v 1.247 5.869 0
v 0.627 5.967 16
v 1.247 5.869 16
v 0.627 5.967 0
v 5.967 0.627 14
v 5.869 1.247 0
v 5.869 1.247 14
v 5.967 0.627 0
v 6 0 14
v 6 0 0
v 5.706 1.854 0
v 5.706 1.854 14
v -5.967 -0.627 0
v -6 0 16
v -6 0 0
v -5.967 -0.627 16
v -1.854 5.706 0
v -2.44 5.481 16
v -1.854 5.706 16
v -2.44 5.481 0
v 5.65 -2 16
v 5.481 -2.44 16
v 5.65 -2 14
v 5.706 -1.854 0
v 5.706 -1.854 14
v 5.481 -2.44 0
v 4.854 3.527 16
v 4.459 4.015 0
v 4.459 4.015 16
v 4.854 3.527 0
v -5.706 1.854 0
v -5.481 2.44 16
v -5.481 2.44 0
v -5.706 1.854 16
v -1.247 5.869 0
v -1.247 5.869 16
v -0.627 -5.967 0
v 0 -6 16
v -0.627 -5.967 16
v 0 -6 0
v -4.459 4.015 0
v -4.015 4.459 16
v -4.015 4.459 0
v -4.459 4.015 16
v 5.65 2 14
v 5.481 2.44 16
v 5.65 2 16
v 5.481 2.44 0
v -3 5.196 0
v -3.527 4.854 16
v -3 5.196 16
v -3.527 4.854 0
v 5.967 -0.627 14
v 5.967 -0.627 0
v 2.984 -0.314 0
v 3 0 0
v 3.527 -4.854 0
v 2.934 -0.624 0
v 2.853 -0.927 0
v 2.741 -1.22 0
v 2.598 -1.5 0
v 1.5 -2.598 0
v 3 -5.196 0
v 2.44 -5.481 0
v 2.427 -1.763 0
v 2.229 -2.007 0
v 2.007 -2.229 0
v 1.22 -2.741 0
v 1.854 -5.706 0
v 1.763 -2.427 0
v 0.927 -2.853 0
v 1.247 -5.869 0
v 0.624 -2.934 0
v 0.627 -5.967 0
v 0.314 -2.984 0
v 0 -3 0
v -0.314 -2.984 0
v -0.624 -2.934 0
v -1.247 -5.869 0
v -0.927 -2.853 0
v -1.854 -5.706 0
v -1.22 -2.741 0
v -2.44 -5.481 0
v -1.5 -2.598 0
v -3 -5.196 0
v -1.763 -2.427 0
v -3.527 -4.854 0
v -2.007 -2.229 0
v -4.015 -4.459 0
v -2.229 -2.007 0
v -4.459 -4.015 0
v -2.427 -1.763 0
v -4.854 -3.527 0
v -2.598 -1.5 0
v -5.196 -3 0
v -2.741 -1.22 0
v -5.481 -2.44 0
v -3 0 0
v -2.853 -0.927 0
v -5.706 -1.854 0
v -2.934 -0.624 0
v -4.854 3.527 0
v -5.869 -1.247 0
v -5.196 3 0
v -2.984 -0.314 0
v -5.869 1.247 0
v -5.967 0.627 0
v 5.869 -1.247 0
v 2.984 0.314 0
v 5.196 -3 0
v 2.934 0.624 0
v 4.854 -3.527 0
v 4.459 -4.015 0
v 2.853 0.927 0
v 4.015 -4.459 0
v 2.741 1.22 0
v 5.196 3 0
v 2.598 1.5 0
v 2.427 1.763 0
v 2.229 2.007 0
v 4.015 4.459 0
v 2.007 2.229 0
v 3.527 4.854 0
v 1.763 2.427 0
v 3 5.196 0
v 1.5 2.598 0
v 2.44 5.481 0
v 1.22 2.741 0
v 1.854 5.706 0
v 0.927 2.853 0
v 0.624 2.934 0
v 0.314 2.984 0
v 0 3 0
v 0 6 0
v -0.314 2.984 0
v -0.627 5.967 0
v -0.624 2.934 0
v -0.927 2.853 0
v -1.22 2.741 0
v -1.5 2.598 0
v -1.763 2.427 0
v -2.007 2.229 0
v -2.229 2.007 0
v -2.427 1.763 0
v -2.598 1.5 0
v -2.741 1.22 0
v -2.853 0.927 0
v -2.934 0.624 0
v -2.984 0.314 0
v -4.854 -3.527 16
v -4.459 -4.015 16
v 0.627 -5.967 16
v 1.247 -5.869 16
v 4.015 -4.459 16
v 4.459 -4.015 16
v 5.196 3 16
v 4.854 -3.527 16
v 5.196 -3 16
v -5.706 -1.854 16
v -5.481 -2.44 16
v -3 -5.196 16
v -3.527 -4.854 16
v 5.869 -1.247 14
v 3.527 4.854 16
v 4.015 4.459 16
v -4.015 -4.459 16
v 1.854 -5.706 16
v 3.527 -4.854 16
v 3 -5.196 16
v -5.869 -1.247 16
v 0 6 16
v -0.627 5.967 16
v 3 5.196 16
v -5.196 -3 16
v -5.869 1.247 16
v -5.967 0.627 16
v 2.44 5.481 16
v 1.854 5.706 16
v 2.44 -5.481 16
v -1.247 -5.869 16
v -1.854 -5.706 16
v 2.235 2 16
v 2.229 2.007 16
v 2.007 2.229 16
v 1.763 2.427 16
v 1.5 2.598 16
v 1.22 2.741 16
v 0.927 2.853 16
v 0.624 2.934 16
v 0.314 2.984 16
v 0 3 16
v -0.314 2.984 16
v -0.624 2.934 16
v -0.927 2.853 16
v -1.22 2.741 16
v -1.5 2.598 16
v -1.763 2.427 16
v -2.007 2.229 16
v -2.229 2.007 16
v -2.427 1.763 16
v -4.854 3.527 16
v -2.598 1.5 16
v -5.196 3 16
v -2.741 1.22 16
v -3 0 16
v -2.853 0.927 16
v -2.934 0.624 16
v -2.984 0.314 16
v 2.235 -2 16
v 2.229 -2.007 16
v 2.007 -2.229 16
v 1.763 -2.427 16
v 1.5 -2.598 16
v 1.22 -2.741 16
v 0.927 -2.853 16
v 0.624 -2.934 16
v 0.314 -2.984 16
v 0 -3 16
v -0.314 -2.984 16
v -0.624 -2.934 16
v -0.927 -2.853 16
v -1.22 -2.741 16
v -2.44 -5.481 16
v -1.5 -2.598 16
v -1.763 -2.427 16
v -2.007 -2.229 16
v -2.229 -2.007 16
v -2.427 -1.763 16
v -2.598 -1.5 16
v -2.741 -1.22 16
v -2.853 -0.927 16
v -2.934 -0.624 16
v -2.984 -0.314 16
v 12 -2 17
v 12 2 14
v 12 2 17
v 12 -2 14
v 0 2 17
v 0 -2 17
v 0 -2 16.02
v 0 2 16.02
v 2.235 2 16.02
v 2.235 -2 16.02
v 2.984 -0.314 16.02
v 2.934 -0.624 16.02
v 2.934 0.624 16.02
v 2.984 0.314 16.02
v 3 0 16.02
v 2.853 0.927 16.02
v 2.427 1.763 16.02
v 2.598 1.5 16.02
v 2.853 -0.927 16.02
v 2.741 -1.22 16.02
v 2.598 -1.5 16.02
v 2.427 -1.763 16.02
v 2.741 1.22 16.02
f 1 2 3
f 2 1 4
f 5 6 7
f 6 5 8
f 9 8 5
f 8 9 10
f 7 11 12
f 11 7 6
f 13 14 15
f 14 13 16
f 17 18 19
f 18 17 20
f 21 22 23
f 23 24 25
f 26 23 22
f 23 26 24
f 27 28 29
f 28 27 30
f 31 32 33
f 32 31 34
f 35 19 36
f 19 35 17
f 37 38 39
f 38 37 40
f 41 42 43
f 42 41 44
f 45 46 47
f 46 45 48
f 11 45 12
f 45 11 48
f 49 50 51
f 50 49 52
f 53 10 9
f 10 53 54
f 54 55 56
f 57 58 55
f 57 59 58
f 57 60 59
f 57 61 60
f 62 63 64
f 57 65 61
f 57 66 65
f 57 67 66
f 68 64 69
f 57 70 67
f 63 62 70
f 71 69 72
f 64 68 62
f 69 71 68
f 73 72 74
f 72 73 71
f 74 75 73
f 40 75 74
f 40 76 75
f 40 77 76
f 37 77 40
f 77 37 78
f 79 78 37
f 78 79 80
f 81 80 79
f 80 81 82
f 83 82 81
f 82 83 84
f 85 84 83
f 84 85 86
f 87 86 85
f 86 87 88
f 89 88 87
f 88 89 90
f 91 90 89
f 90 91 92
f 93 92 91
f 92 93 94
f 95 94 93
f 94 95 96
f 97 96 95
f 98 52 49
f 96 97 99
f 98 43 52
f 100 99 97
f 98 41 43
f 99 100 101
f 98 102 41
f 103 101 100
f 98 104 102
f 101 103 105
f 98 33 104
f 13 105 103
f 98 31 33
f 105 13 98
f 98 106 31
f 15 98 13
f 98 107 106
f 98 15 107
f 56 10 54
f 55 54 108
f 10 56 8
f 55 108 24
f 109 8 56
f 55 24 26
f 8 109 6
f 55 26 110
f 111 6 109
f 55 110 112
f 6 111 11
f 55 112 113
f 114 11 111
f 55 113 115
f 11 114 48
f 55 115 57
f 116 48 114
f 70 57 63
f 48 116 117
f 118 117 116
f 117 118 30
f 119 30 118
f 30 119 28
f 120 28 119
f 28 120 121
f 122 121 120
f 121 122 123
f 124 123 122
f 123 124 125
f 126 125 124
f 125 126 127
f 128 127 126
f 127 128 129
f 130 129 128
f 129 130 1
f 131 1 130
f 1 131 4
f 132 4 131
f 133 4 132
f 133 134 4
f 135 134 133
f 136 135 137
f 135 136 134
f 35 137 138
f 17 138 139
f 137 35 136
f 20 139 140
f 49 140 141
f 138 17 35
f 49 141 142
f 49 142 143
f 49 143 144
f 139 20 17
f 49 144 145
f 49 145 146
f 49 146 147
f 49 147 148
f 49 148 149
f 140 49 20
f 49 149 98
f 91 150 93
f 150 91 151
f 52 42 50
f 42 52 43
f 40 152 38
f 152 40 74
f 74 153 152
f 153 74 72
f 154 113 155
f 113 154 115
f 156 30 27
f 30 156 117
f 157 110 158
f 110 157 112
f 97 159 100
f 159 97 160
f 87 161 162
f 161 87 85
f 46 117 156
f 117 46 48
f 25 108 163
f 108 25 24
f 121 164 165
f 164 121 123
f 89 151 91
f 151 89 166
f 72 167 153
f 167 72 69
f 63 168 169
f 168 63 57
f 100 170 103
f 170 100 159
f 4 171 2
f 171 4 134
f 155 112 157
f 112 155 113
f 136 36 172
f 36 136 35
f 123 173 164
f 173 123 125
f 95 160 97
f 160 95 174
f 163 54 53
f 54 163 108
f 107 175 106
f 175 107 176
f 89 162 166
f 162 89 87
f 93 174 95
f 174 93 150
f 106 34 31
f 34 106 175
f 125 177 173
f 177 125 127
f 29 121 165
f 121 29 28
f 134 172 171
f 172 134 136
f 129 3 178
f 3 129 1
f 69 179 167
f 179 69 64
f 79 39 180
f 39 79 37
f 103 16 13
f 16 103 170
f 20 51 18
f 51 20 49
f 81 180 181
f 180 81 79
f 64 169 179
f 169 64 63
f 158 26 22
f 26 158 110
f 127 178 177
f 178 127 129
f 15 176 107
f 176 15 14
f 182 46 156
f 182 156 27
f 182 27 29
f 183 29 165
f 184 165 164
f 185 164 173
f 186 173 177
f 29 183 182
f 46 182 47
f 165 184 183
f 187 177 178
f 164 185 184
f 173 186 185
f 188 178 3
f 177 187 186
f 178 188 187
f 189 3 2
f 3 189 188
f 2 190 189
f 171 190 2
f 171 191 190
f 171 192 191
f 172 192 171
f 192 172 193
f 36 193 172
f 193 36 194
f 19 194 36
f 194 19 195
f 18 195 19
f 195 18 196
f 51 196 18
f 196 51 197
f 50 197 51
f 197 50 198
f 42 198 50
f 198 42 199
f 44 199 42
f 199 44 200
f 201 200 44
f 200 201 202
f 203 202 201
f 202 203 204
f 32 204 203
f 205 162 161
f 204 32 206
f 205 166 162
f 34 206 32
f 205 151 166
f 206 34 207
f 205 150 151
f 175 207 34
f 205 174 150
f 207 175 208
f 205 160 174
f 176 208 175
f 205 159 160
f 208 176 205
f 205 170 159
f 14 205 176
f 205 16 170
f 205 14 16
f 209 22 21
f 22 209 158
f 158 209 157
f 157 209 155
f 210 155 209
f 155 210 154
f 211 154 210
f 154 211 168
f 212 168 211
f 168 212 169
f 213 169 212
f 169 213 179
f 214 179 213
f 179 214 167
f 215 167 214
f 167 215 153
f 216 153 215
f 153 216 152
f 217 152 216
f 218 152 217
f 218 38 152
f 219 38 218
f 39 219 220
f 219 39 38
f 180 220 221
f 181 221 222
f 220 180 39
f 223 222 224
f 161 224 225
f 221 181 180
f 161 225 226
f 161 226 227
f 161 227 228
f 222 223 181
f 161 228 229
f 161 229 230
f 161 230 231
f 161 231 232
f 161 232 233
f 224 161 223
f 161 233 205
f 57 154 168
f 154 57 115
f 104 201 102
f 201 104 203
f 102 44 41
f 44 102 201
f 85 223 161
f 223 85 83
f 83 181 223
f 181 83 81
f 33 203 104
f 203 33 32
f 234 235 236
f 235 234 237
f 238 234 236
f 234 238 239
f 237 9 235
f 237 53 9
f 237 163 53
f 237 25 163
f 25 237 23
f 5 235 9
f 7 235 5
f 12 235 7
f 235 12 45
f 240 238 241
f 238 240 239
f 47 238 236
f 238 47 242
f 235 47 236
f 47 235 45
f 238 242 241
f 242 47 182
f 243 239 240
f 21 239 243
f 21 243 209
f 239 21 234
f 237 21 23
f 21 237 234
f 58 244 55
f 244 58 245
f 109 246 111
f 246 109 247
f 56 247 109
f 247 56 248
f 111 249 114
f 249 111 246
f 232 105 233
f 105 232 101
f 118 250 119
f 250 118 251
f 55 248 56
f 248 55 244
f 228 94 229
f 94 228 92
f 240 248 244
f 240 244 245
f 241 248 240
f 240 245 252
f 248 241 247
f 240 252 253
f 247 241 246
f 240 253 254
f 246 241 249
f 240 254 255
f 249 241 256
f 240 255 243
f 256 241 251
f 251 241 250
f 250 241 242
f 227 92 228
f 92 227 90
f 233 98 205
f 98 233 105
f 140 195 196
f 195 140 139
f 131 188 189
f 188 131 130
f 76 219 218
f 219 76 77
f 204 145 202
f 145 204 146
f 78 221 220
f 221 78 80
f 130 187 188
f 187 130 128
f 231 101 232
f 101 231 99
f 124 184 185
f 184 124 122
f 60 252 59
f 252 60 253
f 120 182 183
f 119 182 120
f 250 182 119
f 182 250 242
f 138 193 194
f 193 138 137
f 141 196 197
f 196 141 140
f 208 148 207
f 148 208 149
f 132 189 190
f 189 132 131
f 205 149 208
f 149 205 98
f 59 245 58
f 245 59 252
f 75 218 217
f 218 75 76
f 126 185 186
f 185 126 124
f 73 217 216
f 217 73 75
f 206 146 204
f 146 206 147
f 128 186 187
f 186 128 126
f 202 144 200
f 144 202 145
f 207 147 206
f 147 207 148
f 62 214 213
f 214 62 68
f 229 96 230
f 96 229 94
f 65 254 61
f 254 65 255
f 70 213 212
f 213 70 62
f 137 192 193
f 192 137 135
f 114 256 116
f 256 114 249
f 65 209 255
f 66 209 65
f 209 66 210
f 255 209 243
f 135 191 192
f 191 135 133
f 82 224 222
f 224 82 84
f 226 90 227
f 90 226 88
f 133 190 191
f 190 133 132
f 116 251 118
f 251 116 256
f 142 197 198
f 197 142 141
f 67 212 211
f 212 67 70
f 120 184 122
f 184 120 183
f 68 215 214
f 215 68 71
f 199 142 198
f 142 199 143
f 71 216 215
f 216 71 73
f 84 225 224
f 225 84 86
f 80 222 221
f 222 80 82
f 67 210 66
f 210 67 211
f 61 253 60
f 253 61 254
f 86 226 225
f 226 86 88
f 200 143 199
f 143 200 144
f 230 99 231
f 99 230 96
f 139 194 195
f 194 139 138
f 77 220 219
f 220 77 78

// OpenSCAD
// Quarter-turn cam lock.
$fn = 60;
eps = 0.02;
body_d = 12;
body_l = 16;
arm_l = 12;
difference() { union() { cylinder(d=body_d,h=body_l); translate([0,-2,body_l-2]) cube([arm_l,4,3]); } translate([0,0,-eps]) cylinder(d=6,h=body_l+2*eps); }
